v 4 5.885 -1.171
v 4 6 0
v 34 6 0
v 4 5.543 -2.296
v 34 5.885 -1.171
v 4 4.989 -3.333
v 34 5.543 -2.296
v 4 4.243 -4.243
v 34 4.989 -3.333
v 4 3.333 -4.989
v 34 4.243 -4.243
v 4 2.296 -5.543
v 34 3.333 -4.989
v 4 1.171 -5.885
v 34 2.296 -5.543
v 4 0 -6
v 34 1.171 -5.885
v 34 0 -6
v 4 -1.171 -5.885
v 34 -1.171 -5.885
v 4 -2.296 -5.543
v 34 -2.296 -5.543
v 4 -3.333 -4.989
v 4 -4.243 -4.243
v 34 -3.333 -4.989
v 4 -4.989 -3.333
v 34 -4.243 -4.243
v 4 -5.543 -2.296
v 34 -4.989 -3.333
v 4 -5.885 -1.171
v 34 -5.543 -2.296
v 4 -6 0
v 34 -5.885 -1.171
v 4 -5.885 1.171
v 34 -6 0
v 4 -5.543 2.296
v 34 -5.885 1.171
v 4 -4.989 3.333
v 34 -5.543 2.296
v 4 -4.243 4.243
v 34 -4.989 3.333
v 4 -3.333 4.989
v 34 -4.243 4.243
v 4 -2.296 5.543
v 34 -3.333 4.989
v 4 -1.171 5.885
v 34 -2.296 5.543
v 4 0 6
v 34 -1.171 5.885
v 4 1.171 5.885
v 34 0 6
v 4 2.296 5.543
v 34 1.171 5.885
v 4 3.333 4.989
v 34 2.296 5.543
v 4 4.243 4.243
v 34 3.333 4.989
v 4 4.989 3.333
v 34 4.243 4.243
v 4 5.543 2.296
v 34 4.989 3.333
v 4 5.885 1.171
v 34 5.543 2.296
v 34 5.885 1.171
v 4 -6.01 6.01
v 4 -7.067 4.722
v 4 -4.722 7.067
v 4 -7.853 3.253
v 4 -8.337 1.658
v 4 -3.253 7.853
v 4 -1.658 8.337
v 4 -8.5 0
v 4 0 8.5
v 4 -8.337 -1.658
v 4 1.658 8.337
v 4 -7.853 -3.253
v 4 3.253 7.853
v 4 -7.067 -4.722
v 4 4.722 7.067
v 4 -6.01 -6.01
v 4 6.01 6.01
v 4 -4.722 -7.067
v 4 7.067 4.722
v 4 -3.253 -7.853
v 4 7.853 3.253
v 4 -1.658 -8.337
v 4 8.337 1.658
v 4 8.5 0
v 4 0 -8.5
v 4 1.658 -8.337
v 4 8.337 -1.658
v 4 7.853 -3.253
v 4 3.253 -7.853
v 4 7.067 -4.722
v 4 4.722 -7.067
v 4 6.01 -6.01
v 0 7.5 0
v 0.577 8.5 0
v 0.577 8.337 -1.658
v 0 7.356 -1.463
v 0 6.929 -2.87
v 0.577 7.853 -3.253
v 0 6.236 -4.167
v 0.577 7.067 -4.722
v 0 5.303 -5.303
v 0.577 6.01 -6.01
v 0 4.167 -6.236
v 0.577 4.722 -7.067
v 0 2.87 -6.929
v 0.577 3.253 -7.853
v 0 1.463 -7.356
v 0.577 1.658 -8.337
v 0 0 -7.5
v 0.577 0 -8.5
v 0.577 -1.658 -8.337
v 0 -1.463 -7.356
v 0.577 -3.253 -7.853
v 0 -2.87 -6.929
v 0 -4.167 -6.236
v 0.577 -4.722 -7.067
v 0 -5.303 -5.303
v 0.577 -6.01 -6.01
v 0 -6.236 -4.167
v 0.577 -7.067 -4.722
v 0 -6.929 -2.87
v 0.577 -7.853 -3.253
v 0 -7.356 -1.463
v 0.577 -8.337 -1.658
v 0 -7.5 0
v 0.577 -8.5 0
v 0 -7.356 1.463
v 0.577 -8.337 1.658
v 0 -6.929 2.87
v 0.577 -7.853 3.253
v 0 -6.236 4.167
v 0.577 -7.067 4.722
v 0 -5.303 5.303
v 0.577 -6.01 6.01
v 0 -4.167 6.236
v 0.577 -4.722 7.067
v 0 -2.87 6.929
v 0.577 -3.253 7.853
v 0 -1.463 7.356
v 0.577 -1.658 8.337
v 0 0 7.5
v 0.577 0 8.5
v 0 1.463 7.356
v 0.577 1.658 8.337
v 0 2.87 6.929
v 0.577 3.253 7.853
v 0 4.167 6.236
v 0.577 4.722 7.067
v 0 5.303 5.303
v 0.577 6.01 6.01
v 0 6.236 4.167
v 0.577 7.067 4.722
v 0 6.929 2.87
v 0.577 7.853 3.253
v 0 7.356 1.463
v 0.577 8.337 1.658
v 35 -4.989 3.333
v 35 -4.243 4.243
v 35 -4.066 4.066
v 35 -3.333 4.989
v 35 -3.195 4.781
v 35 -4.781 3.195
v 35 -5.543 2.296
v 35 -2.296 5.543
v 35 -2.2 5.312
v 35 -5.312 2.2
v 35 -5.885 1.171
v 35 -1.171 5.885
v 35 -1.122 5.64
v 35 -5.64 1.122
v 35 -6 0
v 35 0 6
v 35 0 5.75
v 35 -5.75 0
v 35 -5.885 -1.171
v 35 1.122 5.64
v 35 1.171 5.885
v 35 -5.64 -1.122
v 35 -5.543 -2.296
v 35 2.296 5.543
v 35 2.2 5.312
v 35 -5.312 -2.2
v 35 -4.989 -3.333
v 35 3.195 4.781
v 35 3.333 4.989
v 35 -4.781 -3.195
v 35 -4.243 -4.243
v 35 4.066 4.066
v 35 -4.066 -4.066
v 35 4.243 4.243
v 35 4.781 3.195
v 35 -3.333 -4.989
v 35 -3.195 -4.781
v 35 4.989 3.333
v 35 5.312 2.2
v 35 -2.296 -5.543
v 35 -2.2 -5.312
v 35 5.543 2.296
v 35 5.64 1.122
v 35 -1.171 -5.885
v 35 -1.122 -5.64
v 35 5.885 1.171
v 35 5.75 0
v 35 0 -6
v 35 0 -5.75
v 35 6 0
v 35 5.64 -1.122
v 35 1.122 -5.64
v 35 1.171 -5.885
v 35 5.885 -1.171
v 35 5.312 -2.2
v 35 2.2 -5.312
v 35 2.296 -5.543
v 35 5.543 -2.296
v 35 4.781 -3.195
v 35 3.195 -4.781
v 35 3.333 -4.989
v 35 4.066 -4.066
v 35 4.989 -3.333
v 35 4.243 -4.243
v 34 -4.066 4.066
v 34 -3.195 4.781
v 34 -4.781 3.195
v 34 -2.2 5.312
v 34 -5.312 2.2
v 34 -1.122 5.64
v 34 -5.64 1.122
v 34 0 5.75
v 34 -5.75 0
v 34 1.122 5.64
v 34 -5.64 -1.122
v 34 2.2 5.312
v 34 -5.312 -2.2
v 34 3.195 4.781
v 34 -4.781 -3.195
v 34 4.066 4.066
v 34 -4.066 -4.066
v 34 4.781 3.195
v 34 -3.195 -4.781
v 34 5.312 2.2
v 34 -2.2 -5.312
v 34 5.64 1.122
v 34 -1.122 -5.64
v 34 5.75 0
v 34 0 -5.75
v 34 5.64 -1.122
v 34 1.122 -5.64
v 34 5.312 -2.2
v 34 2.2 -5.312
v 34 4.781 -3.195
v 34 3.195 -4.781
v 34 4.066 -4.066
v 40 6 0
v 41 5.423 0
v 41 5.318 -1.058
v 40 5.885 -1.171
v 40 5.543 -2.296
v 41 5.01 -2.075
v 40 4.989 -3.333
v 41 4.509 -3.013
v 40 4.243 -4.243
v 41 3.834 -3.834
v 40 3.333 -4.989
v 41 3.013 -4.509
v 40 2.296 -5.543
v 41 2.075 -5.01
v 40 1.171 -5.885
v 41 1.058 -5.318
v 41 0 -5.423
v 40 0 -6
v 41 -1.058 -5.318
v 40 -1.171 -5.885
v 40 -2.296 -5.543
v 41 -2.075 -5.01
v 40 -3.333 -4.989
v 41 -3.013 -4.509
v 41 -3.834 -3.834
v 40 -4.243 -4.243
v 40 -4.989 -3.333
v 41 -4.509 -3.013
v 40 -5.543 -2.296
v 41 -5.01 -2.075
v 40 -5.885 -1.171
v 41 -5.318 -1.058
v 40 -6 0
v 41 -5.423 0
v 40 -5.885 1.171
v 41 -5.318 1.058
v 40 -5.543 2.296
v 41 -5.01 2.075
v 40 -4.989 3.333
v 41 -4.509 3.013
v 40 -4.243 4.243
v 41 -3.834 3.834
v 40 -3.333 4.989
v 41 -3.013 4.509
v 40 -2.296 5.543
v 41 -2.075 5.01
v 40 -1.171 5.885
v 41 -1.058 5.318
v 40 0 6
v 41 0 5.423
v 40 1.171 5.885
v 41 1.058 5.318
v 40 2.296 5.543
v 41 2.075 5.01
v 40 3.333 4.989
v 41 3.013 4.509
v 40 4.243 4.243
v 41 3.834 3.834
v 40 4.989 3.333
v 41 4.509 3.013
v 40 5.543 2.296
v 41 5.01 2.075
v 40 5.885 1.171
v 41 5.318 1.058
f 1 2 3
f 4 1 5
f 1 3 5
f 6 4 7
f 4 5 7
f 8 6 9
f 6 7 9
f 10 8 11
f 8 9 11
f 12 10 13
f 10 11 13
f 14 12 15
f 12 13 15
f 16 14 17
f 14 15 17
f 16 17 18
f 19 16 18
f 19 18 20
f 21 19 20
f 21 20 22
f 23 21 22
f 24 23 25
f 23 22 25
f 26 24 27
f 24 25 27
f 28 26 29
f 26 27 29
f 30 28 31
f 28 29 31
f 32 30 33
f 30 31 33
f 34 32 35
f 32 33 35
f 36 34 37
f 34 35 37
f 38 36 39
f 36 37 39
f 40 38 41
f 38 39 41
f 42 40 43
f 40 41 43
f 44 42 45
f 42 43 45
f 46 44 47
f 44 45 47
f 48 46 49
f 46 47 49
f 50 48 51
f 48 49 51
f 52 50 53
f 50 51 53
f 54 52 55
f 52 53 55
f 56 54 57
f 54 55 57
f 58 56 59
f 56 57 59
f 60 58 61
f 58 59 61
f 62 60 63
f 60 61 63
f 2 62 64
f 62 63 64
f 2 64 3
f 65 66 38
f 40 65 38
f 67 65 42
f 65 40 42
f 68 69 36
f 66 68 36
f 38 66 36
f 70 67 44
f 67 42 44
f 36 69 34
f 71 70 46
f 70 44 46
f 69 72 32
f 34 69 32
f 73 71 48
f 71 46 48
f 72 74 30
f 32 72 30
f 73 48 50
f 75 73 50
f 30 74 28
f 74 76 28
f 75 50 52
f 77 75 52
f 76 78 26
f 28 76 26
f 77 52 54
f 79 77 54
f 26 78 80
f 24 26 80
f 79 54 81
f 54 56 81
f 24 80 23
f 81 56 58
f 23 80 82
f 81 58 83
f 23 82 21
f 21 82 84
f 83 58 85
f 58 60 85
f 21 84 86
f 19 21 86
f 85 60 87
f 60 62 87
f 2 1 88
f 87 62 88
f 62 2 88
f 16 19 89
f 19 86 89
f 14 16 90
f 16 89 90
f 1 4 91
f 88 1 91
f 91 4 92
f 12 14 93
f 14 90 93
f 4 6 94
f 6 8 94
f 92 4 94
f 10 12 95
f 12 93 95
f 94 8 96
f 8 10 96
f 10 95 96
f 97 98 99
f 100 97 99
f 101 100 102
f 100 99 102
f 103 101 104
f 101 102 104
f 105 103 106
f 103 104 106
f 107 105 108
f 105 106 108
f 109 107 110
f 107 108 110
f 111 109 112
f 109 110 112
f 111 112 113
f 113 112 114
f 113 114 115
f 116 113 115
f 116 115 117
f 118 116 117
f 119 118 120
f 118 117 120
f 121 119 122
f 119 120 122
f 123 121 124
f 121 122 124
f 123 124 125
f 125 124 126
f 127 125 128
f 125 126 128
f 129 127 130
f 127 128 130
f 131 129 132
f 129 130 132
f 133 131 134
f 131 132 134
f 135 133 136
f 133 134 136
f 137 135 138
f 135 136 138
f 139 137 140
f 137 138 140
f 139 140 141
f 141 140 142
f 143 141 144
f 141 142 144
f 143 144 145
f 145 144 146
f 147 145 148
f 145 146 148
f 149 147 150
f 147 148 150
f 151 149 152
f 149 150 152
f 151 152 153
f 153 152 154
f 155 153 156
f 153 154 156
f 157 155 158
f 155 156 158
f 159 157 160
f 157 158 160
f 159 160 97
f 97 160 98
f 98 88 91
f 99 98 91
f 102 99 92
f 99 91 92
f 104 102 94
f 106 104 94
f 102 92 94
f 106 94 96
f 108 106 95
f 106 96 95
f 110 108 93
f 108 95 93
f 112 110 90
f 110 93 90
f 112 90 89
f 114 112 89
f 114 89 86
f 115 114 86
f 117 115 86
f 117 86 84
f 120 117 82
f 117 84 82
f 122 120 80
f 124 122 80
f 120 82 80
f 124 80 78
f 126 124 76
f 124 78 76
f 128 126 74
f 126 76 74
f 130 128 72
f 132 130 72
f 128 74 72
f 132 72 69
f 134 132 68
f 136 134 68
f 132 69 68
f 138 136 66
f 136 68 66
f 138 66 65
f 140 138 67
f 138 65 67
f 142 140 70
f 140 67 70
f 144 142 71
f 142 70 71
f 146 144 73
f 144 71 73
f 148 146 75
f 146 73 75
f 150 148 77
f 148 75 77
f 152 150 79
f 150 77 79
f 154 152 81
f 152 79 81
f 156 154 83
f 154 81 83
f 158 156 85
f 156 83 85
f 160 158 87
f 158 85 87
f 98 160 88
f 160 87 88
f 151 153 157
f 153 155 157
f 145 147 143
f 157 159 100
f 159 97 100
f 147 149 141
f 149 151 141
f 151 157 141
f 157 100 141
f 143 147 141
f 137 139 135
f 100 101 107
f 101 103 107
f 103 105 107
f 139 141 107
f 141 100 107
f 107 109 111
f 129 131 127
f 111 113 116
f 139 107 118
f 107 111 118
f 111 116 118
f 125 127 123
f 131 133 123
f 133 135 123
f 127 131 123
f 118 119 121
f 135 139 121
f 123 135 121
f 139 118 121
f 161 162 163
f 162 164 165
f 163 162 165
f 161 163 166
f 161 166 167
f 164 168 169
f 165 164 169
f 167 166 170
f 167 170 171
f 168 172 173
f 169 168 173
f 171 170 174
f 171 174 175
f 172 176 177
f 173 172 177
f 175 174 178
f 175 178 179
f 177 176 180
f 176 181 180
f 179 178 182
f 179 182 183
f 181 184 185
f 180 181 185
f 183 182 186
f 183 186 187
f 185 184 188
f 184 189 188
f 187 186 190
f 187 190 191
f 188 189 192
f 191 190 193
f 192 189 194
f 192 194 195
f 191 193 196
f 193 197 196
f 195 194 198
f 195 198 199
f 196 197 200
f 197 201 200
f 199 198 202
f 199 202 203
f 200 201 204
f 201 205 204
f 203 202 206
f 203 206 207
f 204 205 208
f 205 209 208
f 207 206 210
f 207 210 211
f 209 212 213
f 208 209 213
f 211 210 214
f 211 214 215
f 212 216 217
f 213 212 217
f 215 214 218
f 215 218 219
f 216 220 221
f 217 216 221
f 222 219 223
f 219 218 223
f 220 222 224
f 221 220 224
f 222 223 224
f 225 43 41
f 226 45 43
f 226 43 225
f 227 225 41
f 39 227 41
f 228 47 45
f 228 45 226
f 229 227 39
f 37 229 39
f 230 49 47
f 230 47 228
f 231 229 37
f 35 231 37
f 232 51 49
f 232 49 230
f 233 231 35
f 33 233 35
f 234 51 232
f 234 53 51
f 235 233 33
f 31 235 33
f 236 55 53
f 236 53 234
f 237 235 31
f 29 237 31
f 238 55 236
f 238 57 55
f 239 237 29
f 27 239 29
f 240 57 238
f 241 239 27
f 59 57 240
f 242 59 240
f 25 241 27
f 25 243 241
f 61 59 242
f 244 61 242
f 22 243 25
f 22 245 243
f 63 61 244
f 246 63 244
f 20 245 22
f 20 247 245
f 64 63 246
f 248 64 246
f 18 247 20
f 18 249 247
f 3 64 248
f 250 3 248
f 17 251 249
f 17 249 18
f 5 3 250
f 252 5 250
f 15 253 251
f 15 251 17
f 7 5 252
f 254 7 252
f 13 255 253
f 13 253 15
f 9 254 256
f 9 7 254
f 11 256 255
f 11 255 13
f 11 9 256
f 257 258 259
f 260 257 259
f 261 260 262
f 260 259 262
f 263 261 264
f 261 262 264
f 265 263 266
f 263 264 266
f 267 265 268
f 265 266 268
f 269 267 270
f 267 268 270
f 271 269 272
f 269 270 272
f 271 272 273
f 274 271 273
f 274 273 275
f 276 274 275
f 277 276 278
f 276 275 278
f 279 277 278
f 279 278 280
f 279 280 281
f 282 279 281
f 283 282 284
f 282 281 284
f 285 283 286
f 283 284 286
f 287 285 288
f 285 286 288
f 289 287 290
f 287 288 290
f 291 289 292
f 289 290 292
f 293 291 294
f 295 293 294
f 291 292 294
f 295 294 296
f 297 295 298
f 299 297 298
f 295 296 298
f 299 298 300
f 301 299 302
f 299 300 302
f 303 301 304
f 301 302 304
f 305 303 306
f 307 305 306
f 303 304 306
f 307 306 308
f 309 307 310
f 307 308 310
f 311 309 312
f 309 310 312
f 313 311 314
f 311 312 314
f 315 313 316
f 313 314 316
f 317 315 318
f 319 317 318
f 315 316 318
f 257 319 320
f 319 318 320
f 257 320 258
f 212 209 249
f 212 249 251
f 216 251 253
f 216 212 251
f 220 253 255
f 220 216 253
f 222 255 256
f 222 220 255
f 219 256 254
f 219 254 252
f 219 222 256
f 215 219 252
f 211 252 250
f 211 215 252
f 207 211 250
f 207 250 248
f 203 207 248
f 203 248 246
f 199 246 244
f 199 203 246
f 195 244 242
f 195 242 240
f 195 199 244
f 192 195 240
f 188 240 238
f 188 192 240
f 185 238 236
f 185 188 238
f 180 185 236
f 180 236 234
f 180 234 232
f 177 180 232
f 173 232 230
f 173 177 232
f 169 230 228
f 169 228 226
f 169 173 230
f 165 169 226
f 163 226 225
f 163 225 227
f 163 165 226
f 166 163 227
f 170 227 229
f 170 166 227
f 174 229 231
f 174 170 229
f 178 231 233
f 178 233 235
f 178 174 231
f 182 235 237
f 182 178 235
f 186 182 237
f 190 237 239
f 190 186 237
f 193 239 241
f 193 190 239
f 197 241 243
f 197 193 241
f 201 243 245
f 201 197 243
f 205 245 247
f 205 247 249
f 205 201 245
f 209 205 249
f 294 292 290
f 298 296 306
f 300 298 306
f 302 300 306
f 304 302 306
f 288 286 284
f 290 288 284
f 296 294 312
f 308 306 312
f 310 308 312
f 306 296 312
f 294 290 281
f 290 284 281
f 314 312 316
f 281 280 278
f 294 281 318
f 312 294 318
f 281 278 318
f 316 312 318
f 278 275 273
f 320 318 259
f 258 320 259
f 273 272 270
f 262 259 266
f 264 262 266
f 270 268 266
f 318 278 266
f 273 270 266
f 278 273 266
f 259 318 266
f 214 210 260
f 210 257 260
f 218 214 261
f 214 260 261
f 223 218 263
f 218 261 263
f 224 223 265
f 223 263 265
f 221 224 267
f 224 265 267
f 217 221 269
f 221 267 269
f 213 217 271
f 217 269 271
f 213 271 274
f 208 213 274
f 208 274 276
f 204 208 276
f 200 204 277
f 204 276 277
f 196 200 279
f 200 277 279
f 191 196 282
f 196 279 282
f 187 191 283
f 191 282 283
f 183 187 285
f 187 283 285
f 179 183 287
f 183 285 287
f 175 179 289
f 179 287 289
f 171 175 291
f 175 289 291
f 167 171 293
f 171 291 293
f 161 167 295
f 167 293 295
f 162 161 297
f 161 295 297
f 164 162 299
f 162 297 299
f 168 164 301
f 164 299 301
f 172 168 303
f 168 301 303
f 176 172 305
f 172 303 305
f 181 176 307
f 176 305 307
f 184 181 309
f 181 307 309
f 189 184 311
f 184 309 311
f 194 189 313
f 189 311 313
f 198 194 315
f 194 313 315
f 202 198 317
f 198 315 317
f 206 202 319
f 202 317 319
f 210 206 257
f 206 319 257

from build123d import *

# Parameters (mm, degrees)
SFAZOWANIE1_SIZE           = 1
SFAZOWANIE1_SIZE2          = 0.577350269
SFAZOWANIE1_PART_2_SIZE    = 1
SFAZOWANIE1_PART_2_SIZE2   = 0.577350269
WYTNIJ_WYCI_GNI_CIE1_START = -6
SZKIC2_R                   = 6
SZKIC2_R_2                 = 5.75
WYTNIJ_WYCI_GNI_CIE1_DEPTH = 1


with BuildPart() as part:
    # Szkic1 → Obrót1 (revolve)
    with BuildSketch(Plane.XY):
        Polygon((0, 0), (0, 8.5), (4, 8.5), (4, 6), (41, 6), (41, 0), align=None)
    revolve(axis=Axis((41, 0, 0), (-1, 0, 0)))

    # Sfazowanie1
    sfazowanie1_edges = [part.edges().sort_by_distance(p)[0] for p in [
        (41, -6, 0),
    ]]
    sfazowanie1_side = [part.faces().sort_by_distance(p)[0] for p in [
        (22.5, -6, 0),
    ]]
    chamfer(sfazowanie1_edges, length=SFAZOWANIE1_SIZE, length2=SFAZOWANIE1_SIZE2, reference=sfazowanie1_side[0])

    # Sfazowanie1 part 2
    sfazowanie1_part_2_edges = [part.edges().sort_by_distance(p)[0] for p in [
        (0, -8.5, 0),
    ]]
    sfazowanie1_part_2_side = [part.faces().sort_by_distance(p)[0] for p in [
        (0, 0, 0),
    ]]
    chamfer(sfazowanie1_part_2_edges, length=SFAZOWANIE1_PART_2_SIZE, length2=SFAZOWANIE1_PART_2_SIZE2, reference=sfazowanie1_part_2_side[0])

    # Szkic2 → Wytnij-wyciągnięcie1 (cut)
    with BuildSketch(Plane(origin=(41, 0, 0), x_dir=(0, 0, -1), z_dir=(1, 0, 0)).offset(WYTNIJ_WYCI_GNI_CIE1_START)):
        Circle(SZKIC2_R)
        Circle(SZKIC2_R_2, mode=Mode.SUBTRACT)
    extrude(amount=-WYTNIJ_WYCI_GNI_CIE1_DEPTH, mode=Mode.SUBTRACT)


solid = part.part
